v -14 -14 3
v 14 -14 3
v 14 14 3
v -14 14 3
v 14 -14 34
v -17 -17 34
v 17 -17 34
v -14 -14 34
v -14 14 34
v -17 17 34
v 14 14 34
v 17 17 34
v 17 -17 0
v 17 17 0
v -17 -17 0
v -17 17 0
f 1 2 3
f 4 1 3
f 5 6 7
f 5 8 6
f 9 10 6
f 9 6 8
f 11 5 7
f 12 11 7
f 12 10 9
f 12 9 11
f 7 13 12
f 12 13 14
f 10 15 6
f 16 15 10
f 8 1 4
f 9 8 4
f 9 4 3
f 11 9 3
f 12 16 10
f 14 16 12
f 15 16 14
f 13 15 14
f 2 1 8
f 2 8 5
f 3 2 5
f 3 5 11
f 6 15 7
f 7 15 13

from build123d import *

# Parameters (mm, degrees)
SKETCH_1_W      = 34
SKETCH_1_H      = 34
SKETCH_1_W_2    = 28
SKETCH_1_H_2    = 28
EXTRUDE_1_DEPTH = 34
EXTRUDE_2_REACH = 33
SKETCH_2_W      = 3
SKETCH_2_H      = 28


with BuildPart() as part:
    # 草图1 → 凸台-拉伸1 (new body)
    with BuildSketch(Plane.XY):
        Rectangle(SKETCH_1_W, SKETCH_1_H)
        Rectangle(SKETCH_1_W_2, SKETCH_1_H_2, mode=Mode.SUBTRACT)
    extrude(amount=EXTRUDE_1_DEPTH)

    # 草图2 → 凸台-拉伸2 (add, up to next)
    with BuildSketch(Plane(origin=(-14, 0, 0), x_dir=(0, 0, -1), z_dir=(1, 0, 0)), mode=Mode.PRIVATE) as extrude_2_sk1:
        with Locations((-1.5, 0)):
            Rectangle(SKETCH_2_W, SKETCH_2_H)
    extrude_2_tool1 = extrude(extrude_2_sk1.sketch, amount=EXTRUDE_2_REACH, mode=Mode.PRIVATE) - part.part
    add(extrude_2_tool1.solids().sort_by_distance((-14, 0, 1.5))[0])


solid = part.part
